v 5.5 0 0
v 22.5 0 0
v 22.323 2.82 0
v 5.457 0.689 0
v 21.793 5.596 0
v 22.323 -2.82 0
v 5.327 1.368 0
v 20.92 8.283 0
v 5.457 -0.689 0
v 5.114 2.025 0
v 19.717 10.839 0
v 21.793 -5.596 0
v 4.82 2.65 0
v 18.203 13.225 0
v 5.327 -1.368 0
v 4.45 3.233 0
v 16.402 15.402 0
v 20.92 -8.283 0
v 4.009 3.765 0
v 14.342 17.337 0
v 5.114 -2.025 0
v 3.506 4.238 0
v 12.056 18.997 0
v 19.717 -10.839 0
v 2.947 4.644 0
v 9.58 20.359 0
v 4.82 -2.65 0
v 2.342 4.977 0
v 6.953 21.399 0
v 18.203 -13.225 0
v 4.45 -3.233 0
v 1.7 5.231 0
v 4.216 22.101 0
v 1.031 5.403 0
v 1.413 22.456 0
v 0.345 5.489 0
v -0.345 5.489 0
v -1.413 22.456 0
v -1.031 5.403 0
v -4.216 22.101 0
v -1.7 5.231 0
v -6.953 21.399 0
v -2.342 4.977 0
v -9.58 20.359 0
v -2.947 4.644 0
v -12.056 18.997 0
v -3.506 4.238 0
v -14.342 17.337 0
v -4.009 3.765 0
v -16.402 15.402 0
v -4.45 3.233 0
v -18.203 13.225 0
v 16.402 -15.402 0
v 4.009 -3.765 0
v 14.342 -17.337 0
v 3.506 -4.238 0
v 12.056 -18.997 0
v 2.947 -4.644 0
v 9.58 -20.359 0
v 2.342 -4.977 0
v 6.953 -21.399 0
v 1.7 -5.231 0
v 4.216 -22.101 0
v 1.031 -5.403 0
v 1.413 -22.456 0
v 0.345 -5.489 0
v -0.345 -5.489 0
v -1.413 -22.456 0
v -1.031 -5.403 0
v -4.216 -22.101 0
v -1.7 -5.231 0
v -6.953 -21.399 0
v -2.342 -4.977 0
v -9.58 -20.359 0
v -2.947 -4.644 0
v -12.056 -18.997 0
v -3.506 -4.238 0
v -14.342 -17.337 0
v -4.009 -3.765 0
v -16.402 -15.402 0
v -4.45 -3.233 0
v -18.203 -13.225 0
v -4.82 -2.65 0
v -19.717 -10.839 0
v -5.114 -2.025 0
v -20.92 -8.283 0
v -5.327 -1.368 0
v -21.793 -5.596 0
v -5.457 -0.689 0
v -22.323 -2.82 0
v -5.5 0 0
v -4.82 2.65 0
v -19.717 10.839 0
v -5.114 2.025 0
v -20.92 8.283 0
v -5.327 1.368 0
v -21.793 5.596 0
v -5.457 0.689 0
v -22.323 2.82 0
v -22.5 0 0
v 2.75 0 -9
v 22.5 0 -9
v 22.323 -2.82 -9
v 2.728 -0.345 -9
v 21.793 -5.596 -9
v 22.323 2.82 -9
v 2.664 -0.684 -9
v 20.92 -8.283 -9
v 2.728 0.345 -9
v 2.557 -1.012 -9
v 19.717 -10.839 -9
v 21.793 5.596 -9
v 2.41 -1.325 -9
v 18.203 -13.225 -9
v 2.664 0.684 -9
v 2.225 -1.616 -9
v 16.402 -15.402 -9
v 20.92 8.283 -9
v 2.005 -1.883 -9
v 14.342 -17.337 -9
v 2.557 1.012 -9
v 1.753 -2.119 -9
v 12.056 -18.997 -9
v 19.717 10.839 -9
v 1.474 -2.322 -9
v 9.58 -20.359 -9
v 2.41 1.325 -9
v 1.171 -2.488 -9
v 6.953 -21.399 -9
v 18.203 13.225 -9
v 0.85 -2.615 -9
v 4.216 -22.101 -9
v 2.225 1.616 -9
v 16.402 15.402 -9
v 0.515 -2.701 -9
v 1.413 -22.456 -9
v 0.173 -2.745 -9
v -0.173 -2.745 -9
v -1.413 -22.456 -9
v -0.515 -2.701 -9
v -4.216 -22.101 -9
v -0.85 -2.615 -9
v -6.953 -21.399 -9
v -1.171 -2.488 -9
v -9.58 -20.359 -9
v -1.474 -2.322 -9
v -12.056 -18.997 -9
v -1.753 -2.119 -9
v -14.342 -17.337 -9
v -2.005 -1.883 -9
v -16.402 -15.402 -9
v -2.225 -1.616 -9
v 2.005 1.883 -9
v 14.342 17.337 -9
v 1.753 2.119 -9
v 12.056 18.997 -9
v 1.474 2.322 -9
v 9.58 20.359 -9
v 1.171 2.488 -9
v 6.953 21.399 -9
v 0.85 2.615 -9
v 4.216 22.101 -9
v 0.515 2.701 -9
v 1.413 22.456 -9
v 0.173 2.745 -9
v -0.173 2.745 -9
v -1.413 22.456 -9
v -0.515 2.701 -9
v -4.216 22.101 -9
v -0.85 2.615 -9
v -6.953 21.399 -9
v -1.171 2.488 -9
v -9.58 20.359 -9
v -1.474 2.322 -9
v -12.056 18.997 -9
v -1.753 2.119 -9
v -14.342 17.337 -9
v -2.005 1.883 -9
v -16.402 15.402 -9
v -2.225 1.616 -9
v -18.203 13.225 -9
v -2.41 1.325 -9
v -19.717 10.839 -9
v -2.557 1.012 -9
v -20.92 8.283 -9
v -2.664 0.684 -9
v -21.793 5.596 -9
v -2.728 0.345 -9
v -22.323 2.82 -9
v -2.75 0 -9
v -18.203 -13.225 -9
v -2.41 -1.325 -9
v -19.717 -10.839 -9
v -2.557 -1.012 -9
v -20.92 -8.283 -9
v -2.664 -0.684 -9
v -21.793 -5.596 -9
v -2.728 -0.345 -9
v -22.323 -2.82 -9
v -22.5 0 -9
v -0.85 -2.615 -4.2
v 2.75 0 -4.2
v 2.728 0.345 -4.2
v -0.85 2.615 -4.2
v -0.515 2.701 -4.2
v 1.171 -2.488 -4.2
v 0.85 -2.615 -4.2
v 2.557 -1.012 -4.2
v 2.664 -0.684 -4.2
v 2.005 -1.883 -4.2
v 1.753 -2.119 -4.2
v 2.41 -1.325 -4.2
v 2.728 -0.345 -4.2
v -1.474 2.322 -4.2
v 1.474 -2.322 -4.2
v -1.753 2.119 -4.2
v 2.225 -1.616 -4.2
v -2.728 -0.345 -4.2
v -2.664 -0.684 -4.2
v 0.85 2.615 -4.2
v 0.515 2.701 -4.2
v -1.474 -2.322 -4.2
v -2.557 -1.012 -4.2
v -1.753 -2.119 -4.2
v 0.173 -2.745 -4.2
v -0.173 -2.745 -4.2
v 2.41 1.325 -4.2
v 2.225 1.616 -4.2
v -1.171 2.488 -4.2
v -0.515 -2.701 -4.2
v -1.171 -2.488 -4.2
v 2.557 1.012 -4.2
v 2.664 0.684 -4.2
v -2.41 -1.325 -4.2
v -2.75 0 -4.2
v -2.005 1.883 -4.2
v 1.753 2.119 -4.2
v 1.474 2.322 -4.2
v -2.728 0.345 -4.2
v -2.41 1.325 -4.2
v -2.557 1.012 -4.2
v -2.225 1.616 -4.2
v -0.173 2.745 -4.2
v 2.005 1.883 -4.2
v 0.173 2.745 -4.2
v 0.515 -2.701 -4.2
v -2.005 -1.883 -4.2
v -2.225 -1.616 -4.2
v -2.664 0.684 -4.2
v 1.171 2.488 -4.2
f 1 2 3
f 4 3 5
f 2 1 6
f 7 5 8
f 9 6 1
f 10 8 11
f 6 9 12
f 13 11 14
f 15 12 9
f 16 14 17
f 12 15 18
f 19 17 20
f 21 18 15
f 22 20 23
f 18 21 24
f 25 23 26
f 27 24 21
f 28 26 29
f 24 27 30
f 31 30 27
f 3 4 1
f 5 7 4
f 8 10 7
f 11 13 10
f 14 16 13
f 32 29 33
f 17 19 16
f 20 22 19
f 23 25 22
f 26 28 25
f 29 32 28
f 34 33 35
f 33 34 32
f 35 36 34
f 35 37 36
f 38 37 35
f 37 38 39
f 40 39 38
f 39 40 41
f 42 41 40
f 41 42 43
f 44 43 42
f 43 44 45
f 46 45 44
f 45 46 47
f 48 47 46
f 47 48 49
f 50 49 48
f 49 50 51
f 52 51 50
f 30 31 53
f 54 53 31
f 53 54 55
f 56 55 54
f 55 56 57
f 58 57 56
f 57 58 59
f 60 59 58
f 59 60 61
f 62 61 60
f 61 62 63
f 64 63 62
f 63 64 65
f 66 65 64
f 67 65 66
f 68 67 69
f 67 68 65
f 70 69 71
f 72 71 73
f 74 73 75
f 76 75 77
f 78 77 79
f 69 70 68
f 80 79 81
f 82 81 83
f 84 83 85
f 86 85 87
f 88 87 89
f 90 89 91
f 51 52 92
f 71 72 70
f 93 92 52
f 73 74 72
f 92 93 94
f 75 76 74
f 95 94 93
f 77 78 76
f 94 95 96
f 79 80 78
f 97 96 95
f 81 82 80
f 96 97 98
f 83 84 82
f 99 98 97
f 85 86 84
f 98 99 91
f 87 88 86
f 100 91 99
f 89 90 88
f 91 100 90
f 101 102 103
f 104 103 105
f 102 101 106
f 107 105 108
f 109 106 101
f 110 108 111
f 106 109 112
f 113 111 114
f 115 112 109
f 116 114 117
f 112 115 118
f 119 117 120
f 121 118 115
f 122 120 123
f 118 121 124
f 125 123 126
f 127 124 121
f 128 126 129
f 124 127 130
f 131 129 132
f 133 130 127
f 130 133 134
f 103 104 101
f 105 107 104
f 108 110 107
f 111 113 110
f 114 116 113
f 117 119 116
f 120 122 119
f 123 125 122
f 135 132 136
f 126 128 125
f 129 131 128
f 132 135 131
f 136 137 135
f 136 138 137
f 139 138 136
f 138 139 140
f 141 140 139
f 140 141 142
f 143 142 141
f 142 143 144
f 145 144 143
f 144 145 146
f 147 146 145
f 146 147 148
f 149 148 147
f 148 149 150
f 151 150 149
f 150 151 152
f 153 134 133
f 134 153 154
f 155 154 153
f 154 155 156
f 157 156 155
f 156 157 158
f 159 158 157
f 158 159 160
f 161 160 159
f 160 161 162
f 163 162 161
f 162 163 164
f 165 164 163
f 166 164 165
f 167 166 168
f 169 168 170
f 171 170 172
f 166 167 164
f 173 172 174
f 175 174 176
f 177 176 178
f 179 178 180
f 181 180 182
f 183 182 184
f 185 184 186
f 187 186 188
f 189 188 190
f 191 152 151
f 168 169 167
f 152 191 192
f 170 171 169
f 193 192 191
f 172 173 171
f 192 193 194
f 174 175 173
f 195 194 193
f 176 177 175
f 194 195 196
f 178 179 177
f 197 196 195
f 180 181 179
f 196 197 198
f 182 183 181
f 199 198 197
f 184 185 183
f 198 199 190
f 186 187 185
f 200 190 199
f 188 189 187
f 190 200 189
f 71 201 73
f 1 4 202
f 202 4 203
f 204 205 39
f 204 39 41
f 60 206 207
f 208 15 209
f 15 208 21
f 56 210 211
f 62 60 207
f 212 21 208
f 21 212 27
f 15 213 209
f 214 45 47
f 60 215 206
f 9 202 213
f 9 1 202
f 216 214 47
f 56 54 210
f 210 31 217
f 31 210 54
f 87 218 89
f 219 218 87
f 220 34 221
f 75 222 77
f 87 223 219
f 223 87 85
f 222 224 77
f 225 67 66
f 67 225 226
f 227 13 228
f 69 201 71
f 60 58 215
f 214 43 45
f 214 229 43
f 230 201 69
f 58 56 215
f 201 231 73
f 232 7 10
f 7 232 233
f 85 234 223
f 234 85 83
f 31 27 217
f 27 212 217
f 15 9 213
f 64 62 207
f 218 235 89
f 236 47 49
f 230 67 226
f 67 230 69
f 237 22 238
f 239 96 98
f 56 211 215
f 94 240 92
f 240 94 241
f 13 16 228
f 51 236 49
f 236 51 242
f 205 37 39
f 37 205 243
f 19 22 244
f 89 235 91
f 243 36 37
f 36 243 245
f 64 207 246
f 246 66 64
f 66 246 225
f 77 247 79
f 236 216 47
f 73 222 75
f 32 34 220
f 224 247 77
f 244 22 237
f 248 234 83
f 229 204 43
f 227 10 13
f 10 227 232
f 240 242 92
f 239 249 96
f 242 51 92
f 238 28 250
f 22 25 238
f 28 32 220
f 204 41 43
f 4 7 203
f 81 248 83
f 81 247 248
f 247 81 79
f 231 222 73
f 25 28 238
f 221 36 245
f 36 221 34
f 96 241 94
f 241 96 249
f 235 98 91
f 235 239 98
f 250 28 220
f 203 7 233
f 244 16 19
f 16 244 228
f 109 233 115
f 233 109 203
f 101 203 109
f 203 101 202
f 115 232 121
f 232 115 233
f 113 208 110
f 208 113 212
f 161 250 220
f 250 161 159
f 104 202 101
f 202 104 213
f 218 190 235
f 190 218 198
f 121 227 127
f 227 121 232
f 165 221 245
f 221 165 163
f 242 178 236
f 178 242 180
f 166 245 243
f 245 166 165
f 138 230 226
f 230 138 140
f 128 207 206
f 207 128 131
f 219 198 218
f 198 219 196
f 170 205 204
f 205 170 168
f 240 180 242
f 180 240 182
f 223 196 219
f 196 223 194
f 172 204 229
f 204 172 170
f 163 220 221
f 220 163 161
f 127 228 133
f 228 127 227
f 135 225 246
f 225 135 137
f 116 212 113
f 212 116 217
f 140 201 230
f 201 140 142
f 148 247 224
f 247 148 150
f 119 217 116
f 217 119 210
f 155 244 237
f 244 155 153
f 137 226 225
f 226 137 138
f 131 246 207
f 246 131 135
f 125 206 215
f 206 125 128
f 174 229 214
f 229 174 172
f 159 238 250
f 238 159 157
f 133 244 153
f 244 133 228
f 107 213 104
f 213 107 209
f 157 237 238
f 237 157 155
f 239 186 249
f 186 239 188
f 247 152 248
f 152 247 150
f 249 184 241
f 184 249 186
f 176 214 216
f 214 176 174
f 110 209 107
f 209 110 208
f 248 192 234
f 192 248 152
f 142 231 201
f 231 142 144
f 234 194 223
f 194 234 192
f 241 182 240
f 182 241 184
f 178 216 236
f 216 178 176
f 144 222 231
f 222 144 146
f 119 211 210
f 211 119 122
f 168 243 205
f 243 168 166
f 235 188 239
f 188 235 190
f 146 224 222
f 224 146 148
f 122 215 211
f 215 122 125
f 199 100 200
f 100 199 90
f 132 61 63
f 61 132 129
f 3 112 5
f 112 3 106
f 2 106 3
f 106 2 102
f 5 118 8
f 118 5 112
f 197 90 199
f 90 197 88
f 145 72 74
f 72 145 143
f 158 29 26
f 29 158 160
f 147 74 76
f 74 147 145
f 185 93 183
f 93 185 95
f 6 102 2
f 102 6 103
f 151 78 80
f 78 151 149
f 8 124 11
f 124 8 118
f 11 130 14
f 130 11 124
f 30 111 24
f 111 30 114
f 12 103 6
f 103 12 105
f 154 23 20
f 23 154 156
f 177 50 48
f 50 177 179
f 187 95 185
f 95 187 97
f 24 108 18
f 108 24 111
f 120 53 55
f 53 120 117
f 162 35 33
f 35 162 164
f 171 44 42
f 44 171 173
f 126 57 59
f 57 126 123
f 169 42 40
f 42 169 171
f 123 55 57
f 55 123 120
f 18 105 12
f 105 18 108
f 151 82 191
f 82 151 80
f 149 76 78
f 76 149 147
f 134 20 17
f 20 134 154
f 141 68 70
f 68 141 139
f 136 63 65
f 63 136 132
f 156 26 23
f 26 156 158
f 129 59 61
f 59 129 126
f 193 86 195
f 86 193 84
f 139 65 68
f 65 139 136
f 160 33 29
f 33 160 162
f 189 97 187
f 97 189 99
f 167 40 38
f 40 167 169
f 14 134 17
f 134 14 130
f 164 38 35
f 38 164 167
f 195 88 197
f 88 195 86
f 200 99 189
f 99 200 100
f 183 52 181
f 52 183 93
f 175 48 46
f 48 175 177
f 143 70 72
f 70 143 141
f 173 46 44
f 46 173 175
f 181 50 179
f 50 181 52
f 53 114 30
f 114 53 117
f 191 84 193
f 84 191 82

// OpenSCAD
$fn = 50;


difference() {
	union() {
		translate(v = [0, 0, -9.0000000000]) {
			cylinder(h = 9, r = 22.5000000000);
		}
	}
	union() {
		translate(v = [0, 0, 0]) {
			rotate(a = [0, 0, 0]) {
				difference() {
					union() {
						translate(v = [0, 0, -9.0000000000]) {
							cylinder(h = 9, r = 2.2500000000);
						}
						translate(v = [0, 0, -4.2000000000]) {
							cylinder(h = 4.2000000000, r1 = 2.7500000000, r2 = 5.5000000000);
						}
						translate(v = [0, 0, -9.0000000000]) {
							cylinder(h = 9, r = 2.7500000000);
						}
						translate(v = [0, 0, -9.0000000000]) {
							cylinder(h = 9, r = 2.2500000000);
						}
					}
					union();
				}
			}
		}
	}
}
